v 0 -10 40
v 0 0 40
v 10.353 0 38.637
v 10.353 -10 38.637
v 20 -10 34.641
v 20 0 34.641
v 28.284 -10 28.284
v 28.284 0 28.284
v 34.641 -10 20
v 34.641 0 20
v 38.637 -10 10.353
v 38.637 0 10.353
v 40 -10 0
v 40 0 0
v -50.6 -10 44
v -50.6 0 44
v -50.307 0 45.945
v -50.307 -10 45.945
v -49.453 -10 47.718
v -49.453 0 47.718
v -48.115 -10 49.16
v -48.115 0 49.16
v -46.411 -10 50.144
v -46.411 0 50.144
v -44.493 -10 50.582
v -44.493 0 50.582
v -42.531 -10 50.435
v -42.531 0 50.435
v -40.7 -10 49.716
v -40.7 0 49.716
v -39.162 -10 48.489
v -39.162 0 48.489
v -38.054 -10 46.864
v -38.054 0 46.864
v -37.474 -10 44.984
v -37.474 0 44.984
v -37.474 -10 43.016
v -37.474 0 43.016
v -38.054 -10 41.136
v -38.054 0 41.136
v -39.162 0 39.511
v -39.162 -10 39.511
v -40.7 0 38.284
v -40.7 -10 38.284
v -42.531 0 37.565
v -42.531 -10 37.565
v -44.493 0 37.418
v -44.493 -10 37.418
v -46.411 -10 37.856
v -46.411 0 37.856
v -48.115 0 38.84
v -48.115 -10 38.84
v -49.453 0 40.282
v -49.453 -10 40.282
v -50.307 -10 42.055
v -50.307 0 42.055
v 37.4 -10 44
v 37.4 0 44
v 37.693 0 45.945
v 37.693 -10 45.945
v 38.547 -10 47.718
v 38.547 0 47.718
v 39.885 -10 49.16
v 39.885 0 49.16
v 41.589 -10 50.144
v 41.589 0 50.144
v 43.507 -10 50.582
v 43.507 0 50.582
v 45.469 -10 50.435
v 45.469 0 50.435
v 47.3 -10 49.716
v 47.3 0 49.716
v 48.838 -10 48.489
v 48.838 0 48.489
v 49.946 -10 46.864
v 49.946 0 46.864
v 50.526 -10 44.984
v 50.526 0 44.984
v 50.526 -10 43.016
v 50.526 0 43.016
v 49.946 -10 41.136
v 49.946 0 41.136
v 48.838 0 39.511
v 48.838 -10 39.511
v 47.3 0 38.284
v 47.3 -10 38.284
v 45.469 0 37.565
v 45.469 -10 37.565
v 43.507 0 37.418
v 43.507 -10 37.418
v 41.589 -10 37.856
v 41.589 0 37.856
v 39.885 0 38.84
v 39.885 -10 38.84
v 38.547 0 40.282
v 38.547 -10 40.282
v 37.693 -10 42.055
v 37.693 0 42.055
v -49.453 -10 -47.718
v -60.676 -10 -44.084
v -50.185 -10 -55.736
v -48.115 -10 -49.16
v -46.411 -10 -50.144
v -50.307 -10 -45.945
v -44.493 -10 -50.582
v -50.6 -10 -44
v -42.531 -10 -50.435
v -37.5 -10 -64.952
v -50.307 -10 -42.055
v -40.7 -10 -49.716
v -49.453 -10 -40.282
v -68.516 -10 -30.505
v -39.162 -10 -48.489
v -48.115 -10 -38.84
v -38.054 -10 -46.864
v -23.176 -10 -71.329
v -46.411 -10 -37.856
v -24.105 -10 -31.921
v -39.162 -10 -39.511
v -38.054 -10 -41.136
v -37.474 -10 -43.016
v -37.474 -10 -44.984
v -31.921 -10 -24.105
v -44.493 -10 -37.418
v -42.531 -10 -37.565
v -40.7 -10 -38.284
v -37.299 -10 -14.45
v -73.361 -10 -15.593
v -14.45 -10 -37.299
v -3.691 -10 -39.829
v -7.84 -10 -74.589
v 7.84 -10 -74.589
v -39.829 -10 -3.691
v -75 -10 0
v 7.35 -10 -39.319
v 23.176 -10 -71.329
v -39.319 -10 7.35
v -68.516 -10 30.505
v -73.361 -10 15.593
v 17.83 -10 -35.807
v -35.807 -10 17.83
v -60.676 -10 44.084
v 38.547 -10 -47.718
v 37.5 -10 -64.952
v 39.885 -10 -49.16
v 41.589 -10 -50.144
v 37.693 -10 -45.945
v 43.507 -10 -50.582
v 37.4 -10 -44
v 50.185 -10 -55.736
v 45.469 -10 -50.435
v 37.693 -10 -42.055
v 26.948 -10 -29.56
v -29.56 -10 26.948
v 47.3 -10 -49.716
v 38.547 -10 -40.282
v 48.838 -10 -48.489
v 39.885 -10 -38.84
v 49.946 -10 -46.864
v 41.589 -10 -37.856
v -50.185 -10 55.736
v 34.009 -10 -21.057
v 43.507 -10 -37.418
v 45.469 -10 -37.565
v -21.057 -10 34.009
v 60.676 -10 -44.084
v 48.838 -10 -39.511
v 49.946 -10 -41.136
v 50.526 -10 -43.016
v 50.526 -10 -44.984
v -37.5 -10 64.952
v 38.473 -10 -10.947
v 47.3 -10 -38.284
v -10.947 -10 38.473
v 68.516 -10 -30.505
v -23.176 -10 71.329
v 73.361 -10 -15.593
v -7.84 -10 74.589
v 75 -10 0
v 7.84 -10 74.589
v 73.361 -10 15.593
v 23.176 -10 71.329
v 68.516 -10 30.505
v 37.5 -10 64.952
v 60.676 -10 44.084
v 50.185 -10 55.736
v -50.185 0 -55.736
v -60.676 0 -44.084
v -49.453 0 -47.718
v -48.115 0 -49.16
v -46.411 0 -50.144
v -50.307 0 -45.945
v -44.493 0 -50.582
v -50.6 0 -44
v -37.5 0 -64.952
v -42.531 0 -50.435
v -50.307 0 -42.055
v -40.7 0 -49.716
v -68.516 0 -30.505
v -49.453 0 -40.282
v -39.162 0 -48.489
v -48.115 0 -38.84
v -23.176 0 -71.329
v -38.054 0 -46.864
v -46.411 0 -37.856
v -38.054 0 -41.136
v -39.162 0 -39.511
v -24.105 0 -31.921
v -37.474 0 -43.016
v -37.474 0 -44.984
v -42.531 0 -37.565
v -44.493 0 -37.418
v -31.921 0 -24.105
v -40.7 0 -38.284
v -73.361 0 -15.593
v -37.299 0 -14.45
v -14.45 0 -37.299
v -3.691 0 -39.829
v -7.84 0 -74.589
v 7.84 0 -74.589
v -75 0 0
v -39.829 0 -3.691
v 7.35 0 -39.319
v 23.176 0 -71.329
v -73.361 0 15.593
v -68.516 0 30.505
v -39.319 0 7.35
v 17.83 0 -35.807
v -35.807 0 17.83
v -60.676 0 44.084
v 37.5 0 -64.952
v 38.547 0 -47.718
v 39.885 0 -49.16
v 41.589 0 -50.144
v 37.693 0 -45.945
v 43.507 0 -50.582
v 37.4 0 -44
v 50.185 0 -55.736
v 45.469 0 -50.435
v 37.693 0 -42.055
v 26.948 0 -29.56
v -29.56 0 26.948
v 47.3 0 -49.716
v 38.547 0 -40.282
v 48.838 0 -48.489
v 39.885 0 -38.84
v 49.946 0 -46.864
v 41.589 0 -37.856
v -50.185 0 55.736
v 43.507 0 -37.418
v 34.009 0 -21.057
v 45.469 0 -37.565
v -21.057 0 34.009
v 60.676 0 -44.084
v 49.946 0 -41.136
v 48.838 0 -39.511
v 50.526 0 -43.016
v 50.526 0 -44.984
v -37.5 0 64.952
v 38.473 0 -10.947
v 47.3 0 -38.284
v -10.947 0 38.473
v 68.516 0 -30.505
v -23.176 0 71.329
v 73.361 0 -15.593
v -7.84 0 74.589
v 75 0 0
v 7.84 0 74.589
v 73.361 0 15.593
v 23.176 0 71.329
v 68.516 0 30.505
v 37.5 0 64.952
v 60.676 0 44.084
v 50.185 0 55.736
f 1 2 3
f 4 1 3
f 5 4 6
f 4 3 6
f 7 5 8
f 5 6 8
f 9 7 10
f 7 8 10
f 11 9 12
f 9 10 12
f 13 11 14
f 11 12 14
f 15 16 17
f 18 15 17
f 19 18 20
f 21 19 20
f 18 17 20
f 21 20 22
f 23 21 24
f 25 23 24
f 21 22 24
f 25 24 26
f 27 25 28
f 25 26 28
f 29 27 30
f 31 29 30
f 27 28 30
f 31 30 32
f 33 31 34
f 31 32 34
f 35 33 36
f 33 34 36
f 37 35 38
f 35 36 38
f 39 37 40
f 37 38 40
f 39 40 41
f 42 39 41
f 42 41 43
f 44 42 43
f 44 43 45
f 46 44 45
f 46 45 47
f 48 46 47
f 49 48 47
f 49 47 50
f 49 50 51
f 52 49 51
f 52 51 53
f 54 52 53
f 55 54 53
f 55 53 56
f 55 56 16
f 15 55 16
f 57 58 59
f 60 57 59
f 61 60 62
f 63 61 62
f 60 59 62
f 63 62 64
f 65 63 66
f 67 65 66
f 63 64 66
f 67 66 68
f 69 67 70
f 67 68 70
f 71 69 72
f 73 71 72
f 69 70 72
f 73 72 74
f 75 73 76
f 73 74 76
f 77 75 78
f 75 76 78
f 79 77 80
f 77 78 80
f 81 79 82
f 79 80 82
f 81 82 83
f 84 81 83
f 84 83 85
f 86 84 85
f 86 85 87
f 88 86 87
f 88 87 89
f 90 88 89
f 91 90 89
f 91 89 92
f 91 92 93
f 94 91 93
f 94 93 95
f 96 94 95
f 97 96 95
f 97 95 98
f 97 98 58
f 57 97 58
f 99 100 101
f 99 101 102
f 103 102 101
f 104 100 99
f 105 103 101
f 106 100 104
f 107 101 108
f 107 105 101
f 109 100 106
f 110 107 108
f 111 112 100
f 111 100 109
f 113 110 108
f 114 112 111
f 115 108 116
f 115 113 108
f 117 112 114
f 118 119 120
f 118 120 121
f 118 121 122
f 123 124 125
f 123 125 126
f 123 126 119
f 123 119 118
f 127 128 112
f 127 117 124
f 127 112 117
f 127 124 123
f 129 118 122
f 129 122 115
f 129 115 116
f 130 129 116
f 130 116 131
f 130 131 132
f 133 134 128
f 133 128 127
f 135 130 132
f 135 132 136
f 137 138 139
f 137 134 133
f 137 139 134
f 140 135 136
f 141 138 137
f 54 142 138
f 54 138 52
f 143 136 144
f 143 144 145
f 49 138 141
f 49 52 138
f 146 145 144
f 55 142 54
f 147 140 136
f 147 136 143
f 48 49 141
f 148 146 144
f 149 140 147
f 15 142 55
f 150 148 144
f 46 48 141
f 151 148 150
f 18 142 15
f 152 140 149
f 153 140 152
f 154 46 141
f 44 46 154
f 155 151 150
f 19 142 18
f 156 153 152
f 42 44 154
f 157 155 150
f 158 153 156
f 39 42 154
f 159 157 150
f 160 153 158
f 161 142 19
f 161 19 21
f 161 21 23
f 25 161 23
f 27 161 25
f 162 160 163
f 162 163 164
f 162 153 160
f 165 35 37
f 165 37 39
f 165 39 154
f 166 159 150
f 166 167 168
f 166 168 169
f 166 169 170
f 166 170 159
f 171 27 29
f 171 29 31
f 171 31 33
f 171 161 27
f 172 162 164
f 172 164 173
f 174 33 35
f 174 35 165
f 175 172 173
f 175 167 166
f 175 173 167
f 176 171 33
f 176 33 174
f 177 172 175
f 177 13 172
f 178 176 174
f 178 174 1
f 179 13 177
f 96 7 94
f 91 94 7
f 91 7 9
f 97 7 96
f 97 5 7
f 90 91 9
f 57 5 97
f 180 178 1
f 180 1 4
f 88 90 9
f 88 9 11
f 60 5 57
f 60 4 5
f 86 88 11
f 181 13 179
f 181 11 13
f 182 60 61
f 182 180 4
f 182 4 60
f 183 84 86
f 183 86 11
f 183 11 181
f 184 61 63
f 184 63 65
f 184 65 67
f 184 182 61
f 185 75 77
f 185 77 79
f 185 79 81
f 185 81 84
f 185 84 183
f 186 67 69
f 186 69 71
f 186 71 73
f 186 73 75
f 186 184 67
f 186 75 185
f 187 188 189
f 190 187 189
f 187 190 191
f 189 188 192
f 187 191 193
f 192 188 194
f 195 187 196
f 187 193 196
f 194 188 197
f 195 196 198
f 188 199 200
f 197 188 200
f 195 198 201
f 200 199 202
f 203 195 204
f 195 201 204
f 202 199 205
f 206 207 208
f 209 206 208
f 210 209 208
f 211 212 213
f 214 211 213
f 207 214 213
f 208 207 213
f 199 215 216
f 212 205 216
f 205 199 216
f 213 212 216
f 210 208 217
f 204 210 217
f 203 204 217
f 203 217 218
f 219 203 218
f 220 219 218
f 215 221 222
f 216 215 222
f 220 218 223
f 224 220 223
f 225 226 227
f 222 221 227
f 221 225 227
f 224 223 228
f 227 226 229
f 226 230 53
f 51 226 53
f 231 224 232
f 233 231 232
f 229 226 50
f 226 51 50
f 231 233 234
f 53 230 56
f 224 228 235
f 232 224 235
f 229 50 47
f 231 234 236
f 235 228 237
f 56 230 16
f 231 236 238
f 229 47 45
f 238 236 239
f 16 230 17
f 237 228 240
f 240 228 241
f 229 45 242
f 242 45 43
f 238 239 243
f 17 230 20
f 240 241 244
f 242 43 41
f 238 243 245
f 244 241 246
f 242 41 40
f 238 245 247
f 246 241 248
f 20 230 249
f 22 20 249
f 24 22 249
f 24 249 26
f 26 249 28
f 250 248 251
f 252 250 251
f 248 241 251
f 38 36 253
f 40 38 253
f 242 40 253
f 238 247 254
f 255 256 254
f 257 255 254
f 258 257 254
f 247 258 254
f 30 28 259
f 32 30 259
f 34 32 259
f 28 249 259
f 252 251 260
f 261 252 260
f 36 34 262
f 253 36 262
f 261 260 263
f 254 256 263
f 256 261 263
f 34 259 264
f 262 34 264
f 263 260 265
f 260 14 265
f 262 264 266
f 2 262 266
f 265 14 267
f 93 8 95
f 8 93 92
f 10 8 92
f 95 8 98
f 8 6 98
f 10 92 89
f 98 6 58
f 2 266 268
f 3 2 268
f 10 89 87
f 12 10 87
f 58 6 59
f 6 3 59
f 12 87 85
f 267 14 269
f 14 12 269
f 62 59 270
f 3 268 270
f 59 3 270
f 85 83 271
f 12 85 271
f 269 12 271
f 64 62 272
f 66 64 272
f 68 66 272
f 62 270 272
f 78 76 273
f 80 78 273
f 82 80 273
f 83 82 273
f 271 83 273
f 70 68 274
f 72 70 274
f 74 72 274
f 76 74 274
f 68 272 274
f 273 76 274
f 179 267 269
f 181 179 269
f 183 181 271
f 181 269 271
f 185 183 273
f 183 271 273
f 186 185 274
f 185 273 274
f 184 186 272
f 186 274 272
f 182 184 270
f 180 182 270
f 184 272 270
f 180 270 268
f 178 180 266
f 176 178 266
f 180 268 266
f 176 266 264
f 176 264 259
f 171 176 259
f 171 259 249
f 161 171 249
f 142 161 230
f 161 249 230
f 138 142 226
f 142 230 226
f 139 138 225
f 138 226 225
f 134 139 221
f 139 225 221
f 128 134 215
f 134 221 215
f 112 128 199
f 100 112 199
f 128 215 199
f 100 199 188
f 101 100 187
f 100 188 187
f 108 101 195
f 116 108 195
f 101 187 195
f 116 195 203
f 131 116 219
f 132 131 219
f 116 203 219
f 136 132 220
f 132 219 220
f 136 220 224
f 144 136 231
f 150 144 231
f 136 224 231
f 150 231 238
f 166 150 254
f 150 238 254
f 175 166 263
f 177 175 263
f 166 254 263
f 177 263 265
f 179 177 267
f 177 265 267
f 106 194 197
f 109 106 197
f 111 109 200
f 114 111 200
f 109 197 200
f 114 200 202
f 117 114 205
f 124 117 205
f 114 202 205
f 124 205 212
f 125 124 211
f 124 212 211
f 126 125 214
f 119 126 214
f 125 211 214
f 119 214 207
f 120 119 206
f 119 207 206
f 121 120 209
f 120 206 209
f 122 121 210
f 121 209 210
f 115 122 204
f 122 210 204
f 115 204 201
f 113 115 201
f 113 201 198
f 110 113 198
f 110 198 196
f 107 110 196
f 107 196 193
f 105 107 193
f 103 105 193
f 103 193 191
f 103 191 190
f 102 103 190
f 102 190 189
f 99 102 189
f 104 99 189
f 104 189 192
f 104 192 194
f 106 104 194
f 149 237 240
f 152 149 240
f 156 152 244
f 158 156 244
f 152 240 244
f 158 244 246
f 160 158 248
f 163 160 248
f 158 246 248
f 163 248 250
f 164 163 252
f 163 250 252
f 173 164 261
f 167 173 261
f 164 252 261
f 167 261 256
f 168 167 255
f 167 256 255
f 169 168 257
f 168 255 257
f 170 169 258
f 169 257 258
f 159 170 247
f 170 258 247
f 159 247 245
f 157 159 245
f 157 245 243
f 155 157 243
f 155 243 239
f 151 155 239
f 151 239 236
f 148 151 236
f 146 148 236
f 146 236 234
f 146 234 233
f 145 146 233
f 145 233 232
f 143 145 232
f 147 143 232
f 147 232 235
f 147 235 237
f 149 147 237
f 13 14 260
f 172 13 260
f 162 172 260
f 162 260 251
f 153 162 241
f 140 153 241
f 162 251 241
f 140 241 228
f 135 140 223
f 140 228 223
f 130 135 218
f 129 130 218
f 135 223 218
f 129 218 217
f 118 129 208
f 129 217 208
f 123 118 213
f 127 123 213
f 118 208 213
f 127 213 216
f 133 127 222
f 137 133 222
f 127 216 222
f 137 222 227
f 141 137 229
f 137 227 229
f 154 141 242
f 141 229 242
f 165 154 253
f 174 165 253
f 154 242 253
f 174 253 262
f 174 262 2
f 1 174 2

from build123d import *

# Parameters (mm, degrees)
F0_R     = 75
F1_DEPTH = 10
F3_D     = 13.2


with BuildPart() as f1:
    # F0 (on Front) → F1 (new body)
    with BuildSketch(Plane.XZ):
        Circle(F0_R)
        with BuildLine():
            ThreePointArc((0, 40), (28.2842712475, 28.2842712475), (40, 0))
            ThreePointArc((40, 0), (-28.2842712475, -28.2842712475), (0, 40))
        make_face(mode=Mode.SUBTRACT)
    extrude(amount=F1_DEPTH)

    # F3 (through all)
    with Locations(Plane.XZ.offset(10)):
        with Locations((-44, 44), (-44, -44), (44, -44), (44, 44)):
            Hole(F3_D / 2)


solid = f1.part
